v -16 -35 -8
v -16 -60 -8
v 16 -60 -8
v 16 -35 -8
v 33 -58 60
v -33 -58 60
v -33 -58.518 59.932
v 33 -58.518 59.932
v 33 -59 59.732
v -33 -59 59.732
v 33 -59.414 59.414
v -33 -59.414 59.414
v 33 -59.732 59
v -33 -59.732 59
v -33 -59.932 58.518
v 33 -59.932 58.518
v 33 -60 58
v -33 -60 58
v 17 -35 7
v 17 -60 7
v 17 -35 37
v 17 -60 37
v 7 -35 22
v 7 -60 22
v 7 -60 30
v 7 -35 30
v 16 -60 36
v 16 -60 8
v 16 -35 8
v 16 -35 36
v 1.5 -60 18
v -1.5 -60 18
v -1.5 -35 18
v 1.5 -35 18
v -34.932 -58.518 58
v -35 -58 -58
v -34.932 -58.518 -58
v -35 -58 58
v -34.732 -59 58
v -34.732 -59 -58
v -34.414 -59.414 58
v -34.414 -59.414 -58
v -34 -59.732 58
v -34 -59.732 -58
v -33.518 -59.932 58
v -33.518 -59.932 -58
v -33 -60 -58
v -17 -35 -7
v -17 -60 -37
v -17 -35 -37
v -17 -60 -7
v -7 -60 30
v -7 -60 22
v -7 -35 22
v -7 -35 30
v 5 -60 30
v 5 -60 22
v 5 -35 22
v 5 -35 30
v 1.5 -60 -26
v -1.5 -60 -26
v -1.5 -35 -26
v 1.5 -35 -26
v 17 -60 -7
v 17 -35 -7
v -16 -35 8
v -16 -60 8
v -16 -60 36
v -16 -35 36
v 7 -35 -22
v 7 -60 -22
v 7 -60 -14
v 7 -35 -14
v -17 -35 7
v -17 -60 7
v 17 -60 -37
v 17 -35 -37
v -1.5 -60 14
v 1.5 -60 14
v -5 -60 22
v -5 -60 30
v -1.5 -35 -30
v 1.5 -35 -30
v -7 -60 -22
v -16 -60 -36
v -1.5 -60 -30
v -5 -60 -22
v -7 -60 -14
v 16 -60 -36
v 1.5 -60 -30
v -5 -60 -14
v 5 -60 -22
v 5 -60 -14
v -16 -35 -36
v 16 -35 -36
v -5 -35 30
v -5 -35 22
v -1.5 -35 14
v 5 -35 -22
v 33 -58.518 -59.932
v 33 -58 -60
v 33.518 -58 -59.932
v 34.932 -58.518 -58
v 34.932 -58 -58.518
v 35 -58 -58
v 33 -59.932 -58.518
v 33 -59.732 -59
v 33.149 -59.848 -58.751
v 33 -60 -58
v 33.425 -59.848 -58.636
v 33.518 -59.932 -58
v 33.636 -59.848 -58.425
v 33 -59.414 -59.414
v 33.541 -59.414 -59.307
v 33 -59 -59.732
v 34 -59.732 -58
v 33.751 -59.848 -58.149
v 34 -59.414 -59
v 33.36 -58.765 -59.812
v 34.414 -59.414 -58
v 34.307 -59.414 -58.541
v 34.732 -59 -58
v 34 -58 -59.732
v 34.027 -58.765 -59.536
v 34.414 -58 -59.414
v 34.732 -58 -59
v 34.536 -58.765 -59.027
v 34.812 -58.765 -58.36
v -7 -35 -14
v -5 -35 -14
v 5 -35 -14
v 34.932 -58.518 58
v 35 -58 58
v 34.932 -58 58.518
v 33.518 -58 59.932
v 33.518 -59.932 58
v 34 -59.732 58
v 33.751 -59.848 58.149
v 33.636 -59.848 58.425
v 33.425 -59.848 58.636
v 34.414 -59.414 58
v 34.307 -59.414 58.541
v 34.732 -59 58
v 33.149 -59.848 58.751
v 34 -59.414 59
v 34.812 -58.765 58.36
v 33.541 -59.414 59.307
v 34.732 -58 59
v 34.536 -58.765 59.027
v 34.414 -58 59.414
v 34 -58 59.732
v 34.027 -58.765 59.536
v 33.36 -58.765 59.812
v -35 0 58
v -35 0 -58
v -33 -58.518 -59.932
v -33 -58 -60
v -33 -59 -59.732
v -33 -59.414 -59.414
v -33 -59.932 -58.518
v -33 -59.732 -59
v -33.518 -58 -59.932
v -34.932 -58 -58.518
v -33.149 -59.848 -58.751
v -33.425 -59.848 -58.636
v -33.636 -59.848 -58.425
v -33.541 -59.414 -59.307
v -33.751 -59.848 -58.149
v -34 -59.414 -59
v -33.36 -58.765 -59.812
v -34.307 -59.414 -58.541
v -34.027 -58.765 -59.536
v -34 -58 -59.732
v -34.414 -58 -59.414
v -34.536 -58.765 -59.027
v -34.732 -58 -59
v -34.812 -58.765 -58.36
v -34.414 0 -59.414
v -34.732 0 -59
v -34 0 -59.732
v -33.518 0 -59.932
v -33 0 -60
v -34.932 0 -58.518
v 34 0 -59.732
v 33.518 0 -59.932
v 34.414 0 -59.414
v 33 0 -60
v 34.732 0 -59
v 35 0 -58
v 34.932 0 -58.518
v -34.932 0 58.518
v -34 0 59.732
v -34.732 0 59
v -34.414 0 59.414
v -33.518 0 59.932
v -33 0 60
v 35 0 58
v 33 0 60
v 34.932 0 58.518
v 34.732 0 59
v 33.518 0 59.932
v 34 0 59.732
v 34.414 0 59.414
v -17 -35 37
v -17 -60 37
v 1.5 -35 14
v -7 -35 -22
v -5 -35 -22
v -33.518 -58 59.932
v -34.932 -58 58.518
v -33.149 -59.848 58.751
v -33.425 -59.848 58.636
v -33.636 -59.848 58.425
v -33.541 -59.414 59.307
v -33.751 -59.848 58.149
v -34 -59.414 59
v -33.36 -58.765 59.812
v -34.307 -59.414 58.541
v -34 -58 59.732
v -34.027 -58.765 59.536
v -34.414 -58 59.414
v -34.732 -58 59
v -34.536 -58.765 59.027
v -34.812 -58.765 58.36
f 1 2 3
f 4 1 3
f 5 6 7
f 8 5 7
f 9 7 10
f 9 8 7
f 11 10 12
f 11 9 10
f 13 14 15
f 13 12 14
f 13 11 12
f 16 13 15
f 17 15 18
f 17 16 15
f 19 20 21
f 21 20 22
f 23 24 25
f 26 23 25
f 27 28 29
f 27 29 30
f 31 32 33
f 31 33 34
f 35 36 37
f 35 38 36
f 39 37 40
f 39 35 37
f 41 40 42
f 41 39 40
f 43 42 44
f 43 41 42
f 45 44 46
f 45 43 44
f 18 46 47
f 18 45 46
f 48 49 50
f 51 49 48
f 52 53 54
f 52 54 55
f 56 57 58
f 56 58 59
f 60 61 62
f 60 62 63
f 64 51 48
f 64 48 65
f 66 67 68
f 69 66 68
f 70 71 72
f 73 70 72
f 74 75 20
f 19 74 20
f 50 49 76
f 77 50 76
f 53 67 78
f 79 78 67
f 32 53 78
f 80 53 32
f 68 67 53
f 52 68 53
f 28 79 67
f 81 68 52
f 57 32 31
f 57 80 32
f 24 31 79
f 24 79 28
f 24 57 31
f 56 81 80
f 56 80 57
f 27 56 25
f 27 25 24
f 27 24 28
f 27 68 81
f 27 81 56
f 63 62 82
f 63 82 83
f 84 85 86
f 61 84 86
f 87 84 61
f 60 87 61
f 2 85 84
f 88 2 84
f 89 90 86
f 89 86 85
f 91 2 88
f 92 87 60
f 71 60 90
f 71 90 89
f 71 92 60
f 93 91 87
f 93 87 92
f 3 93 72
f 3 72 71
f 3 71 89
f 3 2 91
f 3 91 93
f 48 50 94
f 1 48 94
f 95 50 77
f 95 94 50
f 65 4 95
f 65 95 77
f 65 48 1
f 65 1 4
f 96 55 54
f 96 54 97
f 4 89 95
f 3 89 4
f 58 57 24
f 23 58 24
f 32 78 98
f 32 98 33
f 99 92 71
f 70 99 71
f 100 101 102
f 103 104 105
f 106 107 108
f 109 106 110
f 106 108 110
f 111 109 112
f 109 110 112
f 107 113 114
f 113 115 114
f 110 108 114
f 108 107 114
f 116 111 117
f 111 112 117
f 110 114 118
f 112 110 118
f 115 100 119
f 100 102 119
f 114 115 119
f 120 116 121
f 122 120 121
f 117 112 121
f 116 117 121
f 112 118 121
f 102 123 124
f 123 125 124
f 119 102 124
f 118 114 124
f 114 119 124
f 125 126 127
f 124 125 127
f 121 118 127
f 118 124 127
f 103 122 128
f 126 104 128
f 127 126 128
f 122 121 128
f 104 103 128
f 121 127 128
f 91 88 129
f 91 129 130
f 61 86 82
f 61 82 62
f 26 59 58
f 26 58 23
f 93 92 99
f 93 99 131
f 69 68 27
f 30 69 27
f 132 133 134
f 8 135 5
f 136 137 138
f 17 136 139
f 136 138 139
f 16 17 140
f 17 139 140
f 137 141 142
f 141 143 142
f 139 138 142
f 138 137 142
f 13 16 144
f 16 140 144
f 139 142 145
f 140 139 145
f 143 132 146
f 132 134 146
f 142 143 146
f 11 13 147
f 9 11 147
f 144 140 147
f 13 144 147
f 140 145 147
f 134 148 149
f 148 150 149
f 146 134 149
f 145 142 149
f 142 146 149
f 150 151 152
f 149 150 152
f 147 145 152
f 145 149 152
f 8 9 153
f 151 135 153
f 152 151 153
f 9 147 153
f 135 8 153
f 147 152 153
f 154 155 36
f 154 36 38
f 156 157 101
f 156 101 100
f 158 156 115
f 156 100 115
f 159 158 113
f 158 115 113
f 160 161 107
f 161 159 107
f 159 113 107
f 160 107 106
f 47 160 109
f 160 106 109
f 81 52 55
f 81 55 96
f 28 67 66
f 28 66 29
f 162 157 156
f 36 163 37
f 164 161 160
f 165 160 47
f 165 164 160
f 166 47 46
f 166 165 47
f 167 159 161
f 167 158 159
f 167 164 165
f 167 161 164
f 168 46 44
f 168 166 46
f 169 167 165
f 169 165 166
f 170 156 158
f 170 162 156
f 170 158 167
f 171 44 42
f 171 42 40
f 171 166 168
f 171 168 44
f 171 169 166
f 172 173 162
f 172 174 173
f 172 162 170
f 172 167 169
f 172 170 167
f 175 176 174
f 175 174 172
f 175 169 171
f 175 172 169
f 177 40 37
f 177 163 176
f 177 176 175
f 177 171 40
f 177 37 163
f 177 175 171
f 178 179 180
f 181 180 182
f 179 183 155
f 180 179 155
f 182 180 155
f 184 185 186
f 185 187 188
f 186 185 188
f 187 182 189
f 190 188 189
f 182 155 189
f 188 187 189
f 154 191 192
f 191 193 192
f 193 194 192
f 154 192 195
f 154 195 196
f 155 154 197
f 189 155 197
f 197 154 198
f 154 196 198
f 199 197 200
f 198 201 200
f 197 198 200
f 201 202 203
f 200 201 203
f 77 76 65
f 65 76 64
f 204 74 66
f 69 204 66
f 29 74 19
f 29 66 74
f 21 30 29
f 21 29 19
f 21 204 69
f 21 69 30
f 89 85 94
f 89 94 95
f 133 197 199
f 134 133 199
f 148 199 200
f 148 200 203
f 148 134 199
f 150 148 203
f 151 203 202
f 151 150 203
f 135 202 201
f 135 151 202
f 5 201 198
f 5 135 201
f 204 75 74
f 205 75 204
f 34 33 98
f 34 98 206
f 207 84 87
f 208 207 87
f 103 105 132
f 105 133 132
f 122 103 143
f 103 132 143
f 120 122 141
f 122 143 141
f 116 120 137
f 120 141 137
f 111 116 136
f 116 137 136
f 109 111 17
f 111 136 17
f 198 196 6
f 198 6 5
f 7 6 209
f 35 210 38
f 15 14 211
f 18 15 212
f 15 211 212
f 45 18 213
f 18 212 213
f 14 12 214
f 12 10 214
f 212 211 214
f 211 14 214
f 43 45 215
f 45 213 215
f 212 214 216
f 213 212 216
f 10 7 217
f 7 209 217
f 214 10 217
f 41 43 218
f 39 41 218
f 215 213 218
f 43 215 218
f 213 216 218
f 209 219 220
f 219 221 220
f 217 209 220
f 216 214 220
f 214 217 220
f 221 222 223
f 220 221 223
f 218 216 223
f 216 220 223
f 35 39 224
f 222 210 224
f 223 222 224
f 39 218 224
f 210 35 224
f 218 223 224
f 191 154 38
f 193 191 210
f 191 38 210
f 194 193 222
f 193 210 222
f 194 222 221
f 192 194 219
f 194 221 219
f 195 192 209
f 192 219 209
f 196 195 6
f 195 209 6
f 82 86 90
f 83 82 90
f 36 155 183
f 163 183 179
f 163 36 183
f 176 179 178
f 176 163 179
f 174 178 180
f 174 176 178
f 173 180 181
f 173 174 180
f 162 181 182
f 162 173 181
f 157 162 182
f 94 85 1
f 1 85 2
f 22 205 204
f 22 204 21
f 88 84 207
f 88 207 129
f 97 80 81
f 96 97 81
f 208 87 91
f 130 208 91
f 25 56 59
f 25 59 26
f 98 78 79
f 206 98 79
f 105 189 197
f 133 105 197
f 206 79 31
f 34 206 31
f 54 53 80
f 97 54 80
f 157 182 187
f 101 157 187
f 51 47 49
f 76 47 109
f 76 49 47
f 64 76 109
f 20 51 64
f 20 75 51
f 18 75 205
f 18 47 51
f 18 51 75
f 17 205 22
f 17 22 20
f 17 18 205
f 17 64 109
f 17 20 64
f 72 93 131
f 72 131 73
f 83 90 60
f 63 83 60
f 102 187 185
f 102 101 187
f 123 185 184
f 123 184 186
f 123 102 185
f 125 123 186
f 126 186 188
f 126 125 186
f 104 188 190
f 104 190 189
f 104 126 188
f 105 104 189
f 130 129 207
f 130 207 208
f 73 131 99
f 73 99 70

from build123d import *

# Parameters (mm, degrees)
F0_W     = 70
F0_H     = 120
F1_DEPTH = 60
F2_R     = 2
F3_W     = 34
F3_H     = 30
F3_W_2   = 32
F3_H_2   = 28
F4_DEPTH = 25
F5_W     = 3
F5_H     = 4
F5_W_2   = 2
F5_H_2   = 8
F6_DEPTH = 25


with BuildPart() as f1:
    # F0 (on Front) → F1 (new body)
    with BuildSketch(Plane.XZ):
        Rectangle(F0_W, F0_H)
    extrude(amount=F1_DEPTH)

    # F2
    f2_edges = [f1.edges().sort_by_distance(p)[0] for p in [
        (35, -30, 60),
        (35, -30, -60),
        (-35, -30, 60),
        (-35, -30, -60),
        (0, -60, -60),
        (35, -60, 0),
        (0, -60, 60),
        (-35, -60, 0),
    ]]
    fillet(f2_edges, radius=F2_R)

    # F3 (on face) → F4 (cut)
    with BuildSketch(Plane.XZ.offset(60)):
        with Locations((0, 22)):
            Rectangle(F3_W, F3_H)
        with Locations((0, 22)):
            Rectangle(F3_W_2, F3_H_2, mode=Mode.SUBTRACT)
        with Locations((0, -22)):
            Rectangle(F3_W, F3_H)
        with Locations((0, -22)):
            Rectangle(F3_W_2, F3_H_2, mode=Mode.SUBTRACT)
    extrude(amount=-F4_DEPTH, mode=Mode.SUBTRACT)

    # F5 (on face) → F6 (cut)
    with BuildSketch(Plane.XZ.offset(60)):
        with Locations((0, 16)):
            Rectangle(F5_W, F5_H)
        with Locations((0, -28)):
            Rectangle(F5_W, F5_H)
        with Locations((-6, -18)):
            Rectangle(F5_W_2, F5_H_2)
        with Locations((-6, 26)):
            Rectangle(F5_W_2, F5_H_2)
        with Locations((6, 26)):
            Rectangle(F5_W_2, F5_H_2)
        with Locations((6, -18)):
            Rectangle(F5_W_2, F5_H_2)
    extrude(amount=-F6_DEPTH, mode=Mode.SUBTRACT)


solid = f1.part
